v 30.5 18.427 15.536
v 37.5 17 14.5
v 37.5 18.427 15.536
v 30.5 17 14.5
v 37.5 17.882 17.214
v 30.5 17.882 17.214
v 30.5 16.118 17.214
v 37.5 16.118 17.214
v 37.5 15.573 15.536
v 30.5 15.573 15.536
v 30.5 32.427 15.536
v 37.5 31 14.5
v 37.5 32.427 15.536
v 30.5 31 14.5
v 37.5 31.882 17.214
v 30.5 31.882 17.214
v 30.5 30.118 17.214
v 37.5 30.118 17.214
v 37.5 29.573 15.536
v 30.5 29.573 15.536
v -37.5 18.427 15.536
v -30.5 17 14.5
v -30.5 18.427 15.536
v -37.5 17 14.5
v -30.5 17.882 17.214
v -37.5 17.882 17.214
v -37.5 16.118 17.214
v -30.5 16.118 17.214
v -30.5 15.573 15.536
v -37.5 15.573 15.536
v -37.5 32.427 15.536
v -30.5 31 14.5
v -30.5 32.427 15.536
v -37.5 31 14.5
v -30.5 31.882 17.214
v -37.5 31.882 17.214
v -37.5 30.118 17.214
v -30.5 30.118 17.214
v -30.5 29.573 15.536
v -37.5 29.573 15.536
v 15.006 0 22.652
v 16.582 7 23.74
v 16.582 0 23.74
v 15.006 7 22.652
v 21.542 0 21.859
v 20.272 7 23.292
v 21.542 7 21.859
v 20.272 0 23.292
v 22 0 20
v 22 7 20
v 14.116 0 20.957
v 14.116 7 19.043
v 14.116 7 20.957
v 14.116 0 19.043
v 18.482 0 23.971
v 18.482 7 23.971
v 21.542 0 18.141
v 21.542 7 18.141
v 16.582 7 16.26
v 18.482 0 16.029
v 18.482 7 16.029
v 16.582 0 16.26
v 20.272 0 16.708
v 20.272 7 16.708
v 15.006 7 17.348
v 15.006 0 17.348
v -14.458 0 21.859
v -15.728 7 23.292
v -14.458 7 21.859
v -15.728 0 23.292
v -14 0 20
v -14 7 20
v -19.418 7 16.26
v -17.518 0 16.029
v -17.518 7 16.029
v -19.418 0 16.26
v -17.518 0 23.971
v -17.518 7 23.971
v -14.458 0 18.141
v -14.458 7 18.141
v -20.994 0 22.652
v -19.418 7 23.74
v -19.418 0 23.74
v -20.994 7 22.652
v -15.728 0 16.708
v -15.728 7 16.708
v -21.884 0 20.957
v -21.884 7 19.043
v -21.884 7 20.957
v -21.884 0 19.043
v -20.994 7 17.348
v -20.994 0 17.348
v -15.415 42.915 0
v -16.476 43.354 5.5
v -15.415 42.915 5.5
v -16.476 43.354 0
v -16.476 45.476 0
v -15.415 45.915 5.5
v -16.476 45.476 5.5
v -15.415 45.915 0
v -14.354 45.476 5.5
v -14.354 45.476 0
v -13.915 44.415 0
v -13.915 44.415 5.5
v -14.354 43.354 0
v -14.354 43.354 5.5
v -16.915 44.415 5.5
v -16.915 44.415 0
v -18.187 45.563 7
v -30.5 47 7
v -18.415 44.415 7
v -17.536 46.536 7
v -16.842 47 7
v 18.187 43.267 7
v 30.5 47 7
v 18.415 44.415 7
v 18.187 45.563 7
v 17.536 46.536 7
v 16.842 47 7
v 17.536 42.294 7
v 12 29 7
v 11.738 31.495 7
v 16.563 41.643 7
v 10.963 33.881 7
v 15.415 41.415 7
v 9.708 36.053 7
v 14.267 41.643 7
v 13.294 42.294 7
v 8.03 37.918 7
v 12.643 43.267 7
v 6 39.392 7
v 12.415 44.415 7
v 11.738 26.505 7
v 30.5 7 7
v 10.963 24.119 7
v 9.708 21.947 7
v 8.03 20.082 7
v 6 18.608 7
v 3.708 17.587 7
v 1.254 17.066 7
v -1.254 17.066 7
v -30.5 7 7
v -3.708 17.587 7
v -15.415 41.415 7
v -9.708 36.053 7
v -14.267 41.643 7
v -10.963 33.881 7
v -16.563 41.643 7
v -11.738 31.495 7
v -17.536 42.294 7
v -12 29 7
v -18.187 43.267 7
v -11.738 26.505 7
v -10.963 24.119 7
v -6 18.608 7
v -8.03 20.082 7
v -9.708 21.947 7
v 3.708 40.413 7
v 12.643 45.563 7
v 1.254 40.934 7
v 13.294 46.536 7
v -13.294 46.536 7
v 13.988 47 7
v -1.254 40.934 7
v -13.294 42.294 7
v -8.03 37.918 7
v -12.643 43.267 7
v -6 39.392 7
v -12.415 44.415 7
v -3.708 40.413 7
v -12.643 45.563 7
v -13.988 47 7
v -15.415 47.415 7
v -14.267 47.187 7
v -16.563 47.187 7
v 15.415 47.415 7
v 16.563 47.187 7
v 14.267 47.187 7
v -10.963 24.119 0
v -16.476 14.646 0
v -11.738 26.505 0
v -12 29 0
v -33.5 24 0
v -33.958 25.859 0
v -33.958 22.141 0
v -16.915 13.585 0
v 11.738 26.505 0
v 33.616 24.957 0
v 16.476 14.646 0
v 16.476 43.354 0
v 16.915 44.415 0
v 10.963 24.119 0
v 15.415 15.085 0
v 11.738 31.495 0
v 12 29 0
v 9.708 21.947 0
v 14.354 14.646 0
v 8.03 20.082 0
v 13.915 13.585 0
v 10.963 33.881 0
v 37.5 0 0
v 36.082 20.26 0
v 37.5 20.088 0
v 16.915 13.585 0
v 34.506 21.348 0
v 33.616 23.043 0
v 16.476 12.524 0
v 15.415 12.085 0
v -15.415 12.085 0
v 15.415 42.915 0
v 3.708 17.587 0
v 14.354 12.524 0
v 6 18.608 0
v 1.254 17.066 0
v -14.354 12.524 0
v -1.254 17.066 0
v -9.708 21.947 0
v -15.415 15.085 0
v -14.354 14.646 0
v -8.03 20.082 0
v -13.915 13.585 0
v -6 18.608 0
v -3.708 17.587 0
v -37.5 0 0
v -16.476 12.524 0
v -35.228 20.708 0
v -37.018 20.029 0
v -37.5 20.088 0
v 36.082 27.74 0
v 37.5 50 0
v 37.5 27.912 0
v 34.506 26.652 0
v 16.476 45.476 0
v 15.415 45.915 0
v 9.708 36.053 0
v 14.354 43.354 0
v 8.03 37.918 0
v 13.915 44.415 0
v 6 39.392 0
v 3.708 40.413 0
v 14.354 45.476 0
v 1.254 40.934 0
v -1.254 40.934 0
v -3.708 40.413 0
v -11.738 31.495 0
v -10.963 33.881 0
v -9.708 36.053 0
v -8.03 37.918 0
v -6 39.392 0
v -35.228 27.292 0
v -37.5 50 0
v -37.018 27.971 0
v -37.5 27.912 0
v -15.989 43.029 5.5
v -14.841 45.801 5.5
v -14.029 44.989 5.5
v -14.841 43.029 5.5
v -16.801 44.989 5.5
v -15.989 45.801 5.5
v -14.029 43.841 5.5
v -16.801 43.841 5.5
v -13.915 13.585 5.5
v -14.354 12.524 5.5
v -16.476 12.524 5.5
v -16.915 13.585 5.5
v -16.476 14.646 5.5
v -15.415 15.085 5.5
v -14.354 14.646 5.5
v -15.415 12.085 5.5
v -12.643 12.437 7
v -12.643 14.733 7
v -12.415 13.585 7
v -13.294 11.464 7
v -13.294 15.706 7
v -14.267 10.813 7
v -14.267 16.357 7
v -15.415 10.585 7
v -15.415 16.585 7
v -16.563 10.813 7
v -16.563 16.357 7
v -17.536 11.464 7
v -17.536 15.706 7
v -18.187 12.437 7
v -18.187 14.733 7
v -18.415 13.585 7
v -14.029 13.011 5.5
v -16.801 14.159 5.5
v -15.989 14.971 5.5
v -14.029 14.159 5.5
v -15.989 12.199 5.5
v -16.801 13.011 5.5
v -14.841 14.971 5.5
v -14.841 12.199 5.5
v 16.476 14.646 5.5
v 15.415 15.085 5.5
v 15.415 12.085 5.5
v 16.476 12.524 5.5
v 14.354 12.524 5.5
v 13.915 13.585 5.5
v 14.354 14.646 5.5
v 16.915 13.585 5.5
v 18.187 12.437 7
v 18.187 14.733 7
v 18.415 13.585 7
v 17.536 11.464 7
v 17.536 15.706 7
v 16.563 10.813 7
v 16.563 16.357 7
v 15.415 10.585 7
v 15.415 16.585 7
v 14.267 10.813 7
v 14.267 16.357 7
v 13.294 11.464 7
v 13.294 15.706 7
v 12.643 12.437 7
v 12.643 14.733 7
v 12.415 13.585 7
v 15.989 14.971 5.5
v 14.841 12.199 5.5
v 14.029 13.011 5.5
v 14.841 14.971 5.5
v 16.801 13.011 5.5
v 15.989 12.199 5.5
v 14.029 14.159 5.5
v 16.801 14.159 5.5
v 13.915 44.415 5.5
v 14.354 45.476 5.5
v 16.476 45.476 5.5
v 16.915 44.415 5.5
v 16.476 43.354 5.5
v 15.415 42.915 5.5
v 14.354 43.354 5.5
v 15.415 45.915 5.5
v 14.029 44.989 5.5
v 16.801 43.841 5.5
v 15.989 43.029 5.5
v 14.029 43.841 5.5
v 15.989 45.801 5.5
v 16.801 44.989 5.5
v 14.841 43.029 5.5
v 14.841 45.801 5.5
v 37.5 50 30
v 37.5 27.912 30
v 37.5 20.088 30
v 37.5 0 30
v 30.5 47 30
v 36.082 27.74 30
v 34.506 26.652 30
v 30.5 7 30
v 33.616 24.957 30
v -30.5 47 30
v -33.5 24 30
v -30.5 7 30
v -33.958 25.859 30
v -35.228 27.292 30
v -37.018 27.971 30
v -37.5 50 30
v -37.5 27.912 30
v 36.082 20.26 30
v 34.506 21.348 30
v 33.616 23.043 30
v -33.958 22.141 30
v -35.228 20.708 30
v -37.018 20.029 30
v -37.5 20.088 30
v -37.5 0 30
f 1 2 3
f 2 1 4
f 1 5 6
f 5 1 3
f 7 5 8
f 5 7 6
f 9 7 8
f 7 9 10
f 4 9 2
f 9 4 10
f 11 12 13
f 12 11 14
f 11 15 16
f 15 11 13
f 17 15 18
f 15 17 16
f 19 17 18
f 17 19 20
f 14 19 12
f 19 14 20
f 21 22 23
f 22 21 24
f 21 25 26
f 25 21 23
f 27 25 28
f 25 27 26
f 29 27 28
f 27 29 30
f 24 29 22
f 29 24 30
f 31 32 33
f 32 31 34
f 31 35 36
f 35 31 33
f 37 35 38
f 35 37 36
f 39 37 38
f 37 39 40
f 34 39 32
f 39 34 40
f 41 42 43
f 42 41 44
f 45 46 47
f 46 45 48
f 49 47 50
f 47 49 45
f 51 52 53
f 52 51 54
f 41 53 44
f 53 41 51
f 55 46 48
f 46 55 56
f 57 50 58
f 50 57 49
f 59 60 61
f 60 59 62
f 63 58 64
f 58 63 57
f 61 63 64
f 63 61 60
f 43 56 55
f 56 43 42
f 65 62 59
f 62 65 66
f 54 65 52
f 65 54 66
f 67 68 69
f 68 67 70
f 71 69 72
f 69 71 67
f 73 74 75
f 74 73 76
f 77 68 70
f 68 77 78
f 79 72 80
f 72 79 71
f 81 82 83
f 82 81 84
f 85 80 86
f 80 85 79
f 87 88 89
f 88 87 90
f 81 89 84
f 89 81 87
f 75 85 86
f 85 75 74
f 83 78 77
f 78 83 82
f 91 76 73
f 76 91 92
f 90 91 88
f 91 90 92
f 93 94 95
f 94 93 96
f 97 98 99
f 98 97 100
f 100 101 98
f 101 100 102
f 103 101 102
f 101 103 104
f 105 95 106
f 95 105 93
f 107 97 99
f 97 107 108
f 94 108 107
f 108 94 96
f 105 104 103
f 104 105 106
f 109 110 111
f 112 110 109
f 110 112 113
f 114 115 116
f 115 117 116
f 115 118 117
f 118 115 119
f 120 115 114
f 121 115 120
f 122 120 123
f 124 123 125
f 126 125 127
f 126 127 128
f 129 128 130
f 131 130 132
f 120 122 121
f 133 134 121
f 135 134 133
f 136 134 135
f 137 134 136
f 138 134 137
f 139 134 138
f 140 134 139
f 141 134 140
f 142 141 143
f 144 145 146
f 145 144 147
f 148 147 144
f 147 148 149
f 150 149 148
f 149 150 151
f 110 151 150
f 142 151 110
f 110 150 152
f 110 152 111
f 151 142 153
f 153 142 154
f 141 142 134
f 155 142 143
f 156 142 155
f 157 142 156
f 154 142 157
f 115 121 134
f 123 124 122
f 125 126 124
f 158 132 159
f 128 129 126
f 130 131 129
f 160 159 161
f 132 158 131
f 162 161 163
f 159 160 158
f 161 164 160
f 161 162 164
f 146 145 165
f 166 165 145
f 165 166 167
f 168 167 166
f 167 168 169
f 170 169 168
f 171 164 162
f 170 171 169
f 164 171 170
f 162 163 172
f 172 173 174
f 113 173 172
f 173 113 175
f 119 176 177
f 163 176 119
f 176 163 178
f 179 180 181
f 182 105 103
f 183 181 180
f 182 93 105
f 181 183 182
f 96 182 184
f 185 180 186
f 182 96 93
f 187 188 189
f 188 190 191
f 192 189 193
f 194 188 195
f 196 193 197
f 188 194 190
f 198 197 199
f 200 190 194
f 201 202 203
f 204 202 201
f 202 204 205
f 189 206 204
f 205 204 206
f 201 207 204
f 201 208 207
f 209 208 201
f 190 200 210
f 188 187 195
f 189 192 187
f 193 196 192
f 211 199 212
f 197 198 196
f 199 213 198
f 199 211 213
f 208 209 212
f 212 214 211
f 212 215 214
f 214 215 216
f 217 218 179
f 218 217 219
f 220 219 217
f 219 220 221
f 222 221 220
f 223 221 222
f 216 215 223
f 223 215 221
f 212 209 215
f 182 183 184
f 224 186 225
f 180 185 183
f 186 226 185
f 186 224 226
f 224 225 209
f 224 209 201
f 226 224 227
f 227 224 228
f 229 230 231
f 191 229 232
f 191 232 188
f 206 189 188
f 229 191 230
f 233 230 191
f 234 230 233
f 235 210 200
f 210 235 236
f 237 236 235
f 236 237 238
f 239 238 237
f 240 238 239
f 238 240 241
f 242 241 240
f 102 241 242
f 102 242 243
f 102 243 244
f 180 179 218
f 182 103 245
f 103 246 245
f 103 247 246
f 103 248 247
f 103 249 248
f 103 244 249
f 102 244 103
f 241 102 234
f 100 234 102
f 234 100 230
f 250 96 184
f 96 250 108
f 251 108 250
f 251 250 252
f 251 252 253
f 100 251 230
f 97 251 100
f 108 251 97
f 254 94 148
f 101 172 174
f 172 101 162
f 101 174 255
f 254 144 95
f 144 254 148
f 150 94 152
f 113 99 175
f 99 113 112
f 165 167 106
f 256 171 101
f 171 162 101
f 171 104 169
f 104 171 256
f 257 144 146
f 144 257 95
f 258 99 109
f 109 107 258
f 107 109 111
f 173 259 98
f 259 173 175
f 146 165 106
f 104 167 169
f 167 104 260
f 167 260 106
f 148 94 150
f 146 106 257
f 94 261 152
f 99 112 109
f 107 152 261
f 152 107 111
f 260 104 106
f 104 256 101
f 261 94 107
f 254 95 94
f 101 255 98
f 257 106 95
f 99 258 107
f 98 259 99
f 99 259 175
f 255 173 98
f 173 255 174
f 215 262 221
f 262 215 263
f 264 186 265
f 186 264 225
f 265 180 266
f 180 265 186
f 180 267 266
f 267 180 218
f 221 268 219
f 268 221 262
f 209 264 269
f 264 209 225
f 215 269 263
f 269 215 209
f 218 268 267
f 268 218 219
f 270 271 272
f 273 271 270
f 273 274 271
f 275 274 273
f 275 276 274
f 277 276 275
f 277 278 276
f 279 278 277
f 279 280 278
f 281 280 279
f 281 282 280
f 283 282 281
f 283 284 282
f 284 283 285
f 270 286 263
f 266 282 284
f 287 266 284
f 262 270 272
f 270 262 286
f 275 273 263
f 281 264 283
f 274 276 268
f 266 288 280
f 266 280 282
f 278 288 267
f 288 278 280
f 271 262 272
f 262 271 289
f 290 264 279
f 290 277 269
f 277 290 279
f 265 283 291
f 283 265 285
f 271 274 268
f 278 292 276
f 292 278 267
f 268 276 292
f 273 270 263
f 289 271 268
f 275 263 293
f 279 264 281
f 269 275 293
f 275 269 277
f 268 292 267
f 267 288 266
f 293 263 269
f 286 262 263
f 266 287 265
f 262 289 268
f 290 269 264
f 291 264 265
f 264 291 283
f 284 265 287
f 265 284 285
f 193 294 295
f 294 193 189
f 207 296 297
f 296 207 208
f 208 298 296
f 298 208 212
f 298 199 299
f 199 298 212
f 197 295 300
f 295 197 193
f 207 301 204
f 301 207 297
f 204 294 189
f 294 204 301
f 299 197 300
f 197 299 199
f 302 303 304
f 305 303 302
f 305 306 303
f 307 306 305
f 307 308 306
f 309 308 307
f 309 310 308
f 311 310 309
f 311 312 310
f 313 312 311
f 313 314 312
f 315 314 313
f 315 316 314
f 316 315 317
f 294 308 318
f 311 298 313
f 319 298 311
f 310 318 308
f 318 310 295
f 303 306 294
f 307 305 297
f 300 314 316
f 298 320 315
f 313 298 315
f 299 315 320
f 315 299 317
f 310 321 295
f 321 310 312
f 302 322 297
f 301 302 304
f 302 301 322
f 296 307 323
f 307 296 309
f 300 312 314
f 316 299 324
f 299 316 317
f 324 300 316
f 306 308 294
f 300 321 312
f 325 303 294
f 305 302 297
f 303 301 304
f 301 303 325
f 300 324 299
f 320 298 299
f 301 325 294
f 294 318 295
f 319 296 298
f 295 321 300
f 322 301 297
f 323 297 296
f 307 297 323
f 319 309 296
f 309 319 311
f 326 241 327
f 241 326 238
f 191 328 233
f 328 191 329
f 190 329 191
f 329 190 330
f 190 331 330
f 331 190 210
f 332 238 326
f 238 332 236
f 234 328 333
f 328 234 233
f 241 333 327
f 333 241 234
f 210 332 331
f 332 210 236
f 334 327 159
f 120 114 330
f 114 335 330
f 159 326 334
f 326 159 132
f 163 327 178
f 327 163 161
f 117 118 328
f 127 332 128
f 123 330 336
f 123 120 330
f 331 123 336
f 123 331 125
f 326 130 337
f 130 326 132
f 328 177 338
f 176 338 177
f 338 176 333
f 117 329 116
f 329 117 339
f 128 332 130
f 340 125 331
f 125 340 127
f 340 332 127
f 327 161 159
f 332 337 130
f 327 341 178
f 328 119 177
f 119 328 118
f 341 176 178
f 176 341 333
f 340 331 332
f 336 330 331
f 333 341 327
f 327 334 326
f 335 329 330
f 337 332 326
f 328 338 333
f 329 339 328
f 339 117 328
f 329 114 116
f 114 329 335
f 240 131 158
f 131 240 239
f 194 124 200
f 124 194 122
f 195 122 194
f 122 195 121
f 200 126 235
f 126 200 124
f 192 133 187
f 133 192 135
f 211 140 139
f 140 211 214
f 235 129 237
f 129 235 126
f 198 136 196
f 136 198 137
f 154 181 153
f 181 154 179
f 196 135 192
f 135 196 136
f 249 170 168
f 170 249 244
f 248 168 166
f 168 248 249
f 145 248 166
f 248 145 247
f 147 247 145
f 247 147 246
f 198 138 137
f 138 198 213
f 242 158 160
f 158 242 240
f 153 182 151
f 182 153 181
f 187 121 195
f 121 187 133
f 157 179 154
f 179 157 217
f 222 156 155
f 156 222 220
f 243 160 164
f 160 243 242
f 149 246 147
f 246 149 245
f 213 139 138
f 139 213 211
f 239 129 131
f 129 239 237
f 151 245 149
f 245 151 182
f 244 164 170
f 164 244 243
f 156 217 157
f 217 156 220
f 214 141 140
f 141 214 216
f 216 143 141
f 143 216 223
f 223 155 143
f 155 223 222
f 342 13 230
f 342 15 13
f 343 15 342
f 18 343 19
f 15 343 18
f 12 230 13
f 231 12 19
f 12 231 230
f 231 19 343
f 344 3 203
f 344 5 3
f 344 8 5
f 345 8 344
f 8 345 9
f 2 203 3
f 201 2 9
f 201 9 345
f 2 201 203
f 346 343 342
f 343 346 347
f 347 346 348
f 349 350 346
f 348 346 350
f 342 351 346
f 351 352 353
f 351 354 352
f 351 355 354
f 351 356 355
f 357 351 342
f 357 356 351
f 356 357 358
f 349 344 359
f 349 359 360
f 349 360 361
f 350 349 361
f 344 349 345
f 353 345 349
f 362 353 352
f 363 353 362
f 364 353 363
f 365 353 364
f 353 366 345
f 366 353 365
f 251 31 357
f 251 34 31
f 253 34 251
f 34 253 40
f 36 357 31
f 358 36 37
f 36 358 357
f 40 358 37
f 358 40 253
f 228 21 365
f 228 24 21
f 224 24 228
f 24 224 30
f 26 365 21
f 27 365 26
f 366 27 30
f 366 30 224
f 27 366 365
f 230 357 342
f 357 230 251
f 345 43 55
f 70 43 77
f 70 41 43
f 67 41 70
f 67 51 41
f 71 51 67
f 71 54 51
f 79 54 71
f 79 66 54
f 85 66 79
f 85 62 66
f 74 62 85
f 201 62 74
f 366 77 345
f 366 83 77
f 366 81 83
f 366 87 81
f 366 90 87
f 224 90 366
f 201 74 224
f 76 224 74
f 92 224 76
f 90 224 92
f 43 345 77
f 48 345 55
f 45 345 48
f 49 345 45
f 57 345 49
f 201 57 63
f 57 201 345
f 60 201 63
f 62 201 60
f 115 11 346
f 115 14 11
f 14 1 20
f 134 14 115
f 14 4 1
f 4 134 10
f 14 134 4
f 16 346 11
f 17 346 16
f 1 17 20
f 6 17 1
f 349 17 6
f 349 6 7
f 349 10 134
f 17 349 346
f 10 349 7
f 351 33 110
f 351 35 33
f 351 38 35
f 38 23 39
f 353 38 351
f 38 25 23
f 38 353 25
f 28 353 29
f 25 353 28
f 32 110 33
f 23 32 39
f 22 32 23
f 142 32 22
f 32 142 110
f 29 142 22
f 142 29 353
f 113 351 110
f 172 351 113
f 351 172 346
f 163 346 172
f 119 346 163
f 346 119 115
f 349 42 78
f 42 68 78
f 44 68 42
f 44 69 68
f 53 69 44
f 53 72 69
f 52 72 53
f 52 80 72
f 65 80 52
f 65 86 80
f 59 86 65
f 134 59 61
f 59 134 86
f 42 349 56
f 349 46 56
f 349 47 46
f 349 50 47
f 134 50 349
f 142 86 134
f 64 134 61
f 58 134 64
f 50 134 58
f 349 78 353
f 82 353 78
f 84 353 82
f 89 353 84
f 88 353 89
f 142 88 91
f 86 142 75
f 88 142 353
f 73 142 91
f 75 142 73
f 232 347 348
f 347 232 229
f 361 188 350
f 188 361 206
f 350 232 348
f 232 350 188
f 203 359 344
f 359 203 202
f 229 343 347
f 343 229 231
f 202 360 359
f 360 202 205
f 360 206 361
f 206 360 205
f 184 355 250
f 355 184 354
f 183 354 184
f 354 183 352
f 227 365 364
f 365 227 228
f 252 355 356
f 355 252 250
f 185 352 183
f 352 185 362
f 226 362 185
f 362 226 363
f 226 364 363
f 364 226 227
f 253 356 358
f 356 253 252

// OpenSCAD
// file: includes/includes/jonaskuehling-default.scad
module teardrop (r=4.5,h=20,alpha=45,teardropcorner=0,fulldrop=false){		// tear drop hole for top-centering
											// use teardropcorner=1 for bottom horizontal corners
	render()
	translate([-h/2,0,0])
		rotate([-270,0+(teardropcorner*180),90])
			difference(){
				linear_extrude(height=h){
					circle(r, $fn=24);
					polygon(points=[[0,0],[r*cos(alpha),r*sin(alpha)],[0,r/sin(alpha)],[-r*cos(alpha),r*sin(alpha)]], paths=[[0,1,2,3]]);
				}
				if(fulldrop==false) 
					translate([0,(r/sin(alpha))/2+r,h/2]) cube([2*r+2,r/sin(alpha),h+2],center=true);
			}
}

//teardrop(4.5,22,fulldrop=true);



module teardropcentering (r=4.5,h=20,alpha=45){				// tear drop hole for top-centering
	centering_offset_factor = 1.1;
	render()
	translate([-h/2,0,0])
		rotate([-270,0,90])
			difference(){
				linear_extrude(height=h){
					circle(r, $fn=24);
					polygon(points=[[0,0],[r*cos(alpha),r*sin(alpha)],[0,r/sin(alpha)],[-r*cos(alpha),r*sin(alpha)]], paths=[[0,1,2,3]]);
				}
				translate([0,(r/sin(alpha))/2+r*centering_offset_factor,h/2]) cube([2*r+2,r/sin(alpha),h+2],center=true);
			}
}

//teardropcentering();



module teardropcentering_half (r=4.5,h=20, bottom=0,alpha=45){				// tear drop hole for top-centering
																// upper half (bottom=0) or bottom half (bottom=1)
	centering_offset_factor = 1.2;
	render()
	translate([-h/2,0,0])
		rotate([-270,0,90])
			difference(){
				linear_extrude(height=h){
					circle(r, $fn=24);
					polygon(points=[[0,0],[r*cos(alpha),r*sin(alpha)],[0,r/sin(alpha)],[-r*cos(alpha),r*sin(alpha)]], paths=[[0,1,2,3]]);
				}
				translate([0,(r/sin(alpha))/2+r*centering_offset_factor,h/2]) cube([2*r+2,r/sin(alpha),h+2],center=true);
				translate([0,-(r*centering_offset_factor)/2-0.5+bottom*(r*centering_offset_factor+1),h/2]) cube([2*r+2,r*centering_offset_factor+1,h+2],center=true);
			}
}

//teardropcentering_half(bottom=0);


module polyhole(d,h){
	n = max(round(2 * d),3);
	cylinder(h = h, r = (d / 2) / cos (180 / n), $fn = n, center=true);
}



module roundcorner(radius,edge_length){
	render()
	translate([0,0,-1])
		difference(){
			translate([-1,-1,0]) cube(size = [radius+1,radius+1,edge_length+2], center = false);
			translate(v = [radius,radius,-1]) cylinder(h = edge_length+4, r=radius, center=false);
		}
}

//roundcorner(5,5);



module roundcorner_tear(radius,edge_length){
	render()
	difference(){
		translate([-1,-1,-1]) cube(size = [edge_length+2, radius+1, radius+1], center = false);
		translate([(edge_length+4)/2-2, radius, radius])
			teardrop(radius, edge_length+4,teardropcorner=1);
	}
}

//roundcorner_tear(8,20);



module nut_trap(nut_wrench_size,trap_height,vertical=true, clearance=0.2){		// M3 wrench size = 5.5
	cornerdiameter =  (((nut_wrench_size)/2)+clearance) / cos(180/6);
	rotate([0,vertical*90,0])
		cylinder(h = trap_height, r = cornerdiameter, center=true, $fn = 6);
}



module nut_slot(nut_wrench_size,nut_height, nut_elevation,vertical=false, clearance=0.2){		// M3 wrench size = 5.5
	cornerdiameter =  (((nut_wrench_size)/2)+clearance) / cos(180/6);
	slot_height = nut_height+2*clearance;
	slot_width = nut_wrench_size+2*clearance;
	rotate([0,vertical*270,0]){
		cylinder(h = slot_height, r = cornerdiameter, center=true, $fn = 6);
		translate([0,-slot_width/2,-slot_height/2]) cube([nut_elevation+1,slot_width,slot_height]);
	}
}

//nut_slot(5.5,3,4,1);



module barbell (x1,x2,r1,r2,r3,r4) 
{
	x3=triangulate (x1,x2,r1+r3,r2+r3);
	x4=triangulate (x2,x1,r2+r4,r1+r4);
	render()
	difference ()
	{
		union()
		{
			translate(x1)
			circle (r=r1);
			translate(x2)
			circle(r=r2);
			polygon (points=[x1,x3,x2,x4]);
		}
		
		translate(x3)
		circle(r=r3,$fa=5);
		translate(x4)
		circle(r=r4,$fa=5);
	}
}

function triangulate (point1, point2, length1, length2) = 
point1 + 
length1*rotated(
atan2(point2[1]-point1[1],point2[0]-point1[0])+
angle(distance(point1,point2),length1,length2));

function distance(point1,point2)=
sqrt((point1[0]-point2[0])*(point1[0]-point2[0])+
(point1[1]-point2[1])*(point1[1]-point2[1]));

function angle(a,b,c) = acos((a*a+b*b-c*c)/(2*a*b)); 

function rotated(a)=[cos(a),sin(a),0];
// file: includes/lm8uu-holder-slim_double-vertical.scad
// LM8UU holder slim
// *********************************************
// Jonas Kühling
// http://www.jonaskuehling.de
// http://www.thingiverse.com/jonaskuehling
// *********************************************
// derived from:
// http://www.thingiverse.com/thing:14942

use <includes/jonaskuehling-default.scad>

// LM8UU/rod dimensions
LM8UU_dia = 15.4;
LM8UU_length = 24;
rod_dia = 8;

//screw/nut dimensions (M3) - hexagon socket head cap screw ISO 4762, hexagon nut ISO 4032
screw_thread_dia_iso = 3;
screw_head_dia_iso = 5.5;
nut_wrench_size_iso = 5.5;


// screw/nut dimensions for use (plus clearance for fitting purpose)
clearance_dia = 0.5;
screw_thread_dia = screw_thread_dia_iso + clearance_dia;
screw_head_dia = screw_head_dia_iso + clearance_dia;
nut_wrench_size = nut_wrench_size_iso + clearance_dia;
nut_dia_perimeter = (nut_wrench_size/cos(30));
nut_dia = nut_dia_perimeter;
nut_surround_thickness = 2;

// main body dimensions
body_wall_thickness = 2;
body_width = LM8UU_dia + (2*body_wall_thickness);
body_height = body_width;
body_length = 60;
gap_width = rod_dia + 2;
screw_bushing_space = 1;
screw_elevation = LM8UU_dia + body_wall_thickness + (screw_thread_dia/2) +screw_bushing_space;

overhang_angle = 60;
r = nut_dia_perimeter/2+nut_surround_thickness;
extra_height_varticalprint = r*sin(90-overhang_angle);

// TEST - uncomment to render in openscad:
//lm8uu_holder_slim_double_vertical();		



// main body
module lm8uu_holder_slim_double_vertical()
{
	// rotate vertical and center bearing around z-axis
	translate([0,-(LM8UU_dia/2+body_wall_thickness),body_length/2])
	rotate([-90,0,0])
	difference()
	{
		union()
		{	
			// body
			translate([-body_width/2,-body_length/2,body_height/2])
				cube([body_width,body_length,(LM8UU_dia/2)+screw_bushing_space+(screw_thread_dia/2)+extra_height_varticalprint]);
			translate([0,0,(LM8UU_dia/2)+body_wall_thickness])		
				rotate([90,0,0])
					cylinder(r=(LM8UU_dia/2)+body_wall_thickness, h=body_length, center=true);
	
			// gap support
			translate([-(gap_width/2)-body_wall_thickness,-(body_length/2),body_height/2])
				cube([body_wall_thickness,LM8UU_length,(LM8UU_dia/2)+screw_bushing_space+(screw_thread_dia/2)]);
			translate([gap_width/2,-(body_length/2),body_height/2])
				cube([body_wall_thickness,LM8UU_length,(LM8UU_dia/2)+screw_bushing_space+(screw_thread_dia/2)]);
	
			for(i=[-(body_length/2-LM8UU_length/2),(body_length/2-LM8UU_length/2)])
			{
				// nut trap surround
				translate([gap_width/2,i,screw_elevation])
					rotate([0,90,0])
						cylinder(r=(((nut_wrench_size+nut_surround_thickness*2)/cos(30))/2), h=(body_width-gap_width)/2, $fn=20);
	
				// Screw hole surround
				translate([-gap_width/2,i,screw_elevation])
					rotate([0,-90,0])
						cylinder(r=(screw_head_dia/2)+nut_surround_thickness, h=(body_width-gap_width)/2, $fn=20);
			}
		}
	
		// bushing hole
		translate([0,0,LM8UU_dia/2+2])
			rotate([90,0,0])
				polyhole(d=LM8UU_dia, h=body_length+1, center=true);
	
		// top gap
		translate([-(gap_width/2),-(body_length/2)-1,body_height/2])
			cube([gap_width,body_length+2,(LM8UU_dia/2)+screw_bushing_space+(screw_thread_dia/2)+(nut_dia/2)+nut_surround_thickness+1]);
	
		for(i=[-(body_length/2-LM8UU_length/2),(body_length/2-LM8UU_length/2)])
		{
			// screw hole (one all the way through)
			translate([0,i,screw_elevation])
				rotate([0,90,0])
					polyhole(d=screw_thread_dia, h=body_width+3, center=true);
		
			// nut trap
			translate([gap_width/2+body_wall_thickness,i,screw_elevation])
				rotate([0,90,0])
					cylinder(r=nut_dia/2, h=body_width/2-gap_width/2-body_wall_thickness+1,$fn=6);
		
			// screw head hole
			translate([-(gap_width)/2-body_wall_thickness,i,screw_elevation])
				rotate([0,-90,0])
					cylinder(r=screw_head_dia/2, h=body_width/2-gap_width/2-body_wall_thickness+1,$fn=20);

		}	
	}
}

/*
// Based on nophead research
module polyhole(d,h,center=false) {
    n = max(round(2 * d),3);
    rotate([0,0,180])
        cylinder(h = h, r = (d / 2) / cos (180 / n), center=center, $fn = n);
}
*/
// file: configuration.scad
// Harmonic drive main parameters
press_angle = 40;
flex_teeth = 50;
teeth_diff = 2;

tol = 0.25; // generic tolerance used in some places
lh = 0.3; // layer height needed in a few places

// Main geometry
bearing_r = 22/2;
bearing_h = 7;
washer_h = 1;
bolthead_h = 4;
stepper_shaft_h = 20;
circ_drive_bearing_indent = 1;
flex_bearing_indent = 1;
drive_bearing_r = 13/2;
drive_bearing_h = 7;

// Flexspline dimensions
flex_inner_r = 25.4;
flex_h = 36;
flex_bottom_h = 2;
flex_bolthole_r = 6;
flex_wt = 0.81;
flex_lip = 1;
pitch = 197;
helix_twist = 5;

// Circspline dimensions
circ_h = 20;
circ_outer_r = 34;
circ_inner_r = 30;
circ_bottom_h = 4;
// Negative clearance cuts a bit from the top of the teeth
circ_tooth_clearance = -0.5;

// Wave driver dimensions
wave_radius = 52.75/2;
driver_h = 12;
driver_w = 10;
drive_bearing_spacing_r = wave_radius - drive_bearing_r;

// The total height of the drive unit, excluding the motor and flexspline base.
assy_h = 50;
stepper_shaft_l = 20;

tooth_overlap = (flex_h + circ_h) - assy_h;

// Position of the middle of the tooth overlap section on the stepper shaft.
stepper_shaft_mid_rot = circ_h - tooth_overlap/2;

echo(str("Tooth overlap: ", tooth_overlap));
echo(str("Drive midpoint on stepper shaft: ", stepper_shaft_mid_rot));

red_r = teeth_diff/flex_teeth;
echo(str("Reduction ratio: 1/", flex_teeth/teeth_diff, " (", red_r, ")"));
echo(str("With 200x16 motor, arc minutes per microstep: ", 360*60/(200*16)*red_r));
echo(str("Linear resolution (mm) for 100 mm arm: ", sin(360/(200*16)*red_r) * 100));
echo(str("Torque (N) at 100 mm for 40 Ncm motor: ", 4/red_r));
echo(str("Linear speed equivalent to standard Prusa's 300 mm/s at 100 mm: ",
         300*80 * sin(360/(200*16)*red_r) * 100));

// Circspline mount dimensions
circ_mount_r = circ_outer_r + 6;
circ_mount_h = 8;
circ_mount_1 = 45;
circ_mount_2 = 135;
circ_mount_3 = 225;

// Master arm height setting
main_arm1_height = 12;
main_arm2_height = 12;

// Arm 1st segment dimensions
arm_flex_base_bottom_h = 3;
arm_flex_base_h = 8;
arm_joint1_base_h = main_arm1_height;
arm_joint1_base_r = 15;
arm_joint1_bearing_indent = 7;
arm_large_bolthole_r=6;
arm_w = 30;
arm1_h = main_arm1_height;

// default length
length = 100;

// Truss generation parameters. The element width must be smaller than
// thickness to avoid the top becoming unprintable (triangle outlines
// over thin air)
truss_thickness = 3.5;
truss_width_coeff = 0.75;
truss_radius = 0.1;
truss_arm1 = 1.07; // Extra coefficient for arm1

// Arm 2nd segment dimensions
arm2_h = main_arm2_height;
arm_separation = arm_joint1_base_h - arm_joint1_bearing_indent 
  + bearing_h + washer_h * 2;
arm_bolthole_r=4;
arm_joint2_base_h = main_arm2_height;
arm_joint2_base_r = 15;
arm_joint3_hollow_r = 10;
arm_joint31_base_h = main_arm2_height;
arm_joint31_base_r = 15;
arm_joint31_bearing_r = 13/2;
arm_joint31_bearing_h = 5;
arm_joint31_bearing_clearance = 2;
arm_joint32_base_h = main_arm2_height;
arm_joint32_base_r = 15;
arm_joint32_tube_h_clearance = 1;
arm_joint32_tube_wt = 2;
arm_joint32_tube_groove_depth = 1;
arm_joint31_bearing_spacing = arm_joint3_hollow_r + arm_joint32_tube_wt 
  + arm_joint31_bearing_r;

echo(str("Arm final stage vertical separation: ", arm_separation));
echo(str("Arm final stage total height: ", arm_separation + 2 * arm2_h));

// Default arm lengths
arm1_length = 100;
arm2_length = 150;
arm_spacing = 75;
arm_base_maxrot = 90 - asin((circ_outer_r + arm_w/2) / arm_spacing);
arm_joint_maxrot = 150; // hand-tuned
echo(str("Arm base minimum rotation to clear other base: ", arm_base_maxrot));

// Z carriage dimensions
carr_floor = 1; // Carriage floor thickness.
carr_wt = 3; // Carriage wall thickness.
carr_truss_width = arm_spacing + bearing_r * 2 + 4; // 120;
carr_truss_depth = 15;
drive_h = assy_h + bearing_h + washer_h 
  + arm_flex_base_bottom_h; // Total length needed by the drive unit.
carr_truss_length = circ_outer_r + 1 + carr_wt + bearing_r + 2;
carr_rod_offset = -45;
carr_drive_offset = -40;
carr_top_support_thickness = 3;
carr_top_support_width = 14;
carr_top_support_length = 70;

// Z end dimensions
z_end_bottom_thickness = 7;
z_end_bottom_width = arm_spacing + 20;
z_end_bottom_length = 40;
z_end_top_length = 50;
z_end_bottom_height = 30;
z_end_rod_offset = 24; // rod center from vertical plate
// file: common.scad
include <configuration.scad>;
use <includes/parametric_involute_gear_v5.0.scad>;
use <includes/SolidReplacementTruss.scad>;
include <includes/lm8uu-holder-slim_double-vertical.scad>;

// Generic spline gear with a herringbone section
module spline_gear(number_of_teeth, circular_pitch, pressure_angle,
                   height, helix_height, twist, backlash, clearance) {
  gear(number_of_teeth=number_of_teeth,
	     circular_pitch=circular_pitch,
	     pressure_angle=pressure_angle,
	     clearance = clearance,
	     gear_thickness = height - helix_height,
   	     rim_thickness = height - helix_height,
	     rim_width = 5,
	     hub_thickness = height - helix_height,
	     hub_diameter=0,
         bore_diameter=0,
	     circles=0,
         backlash=backlash,
	     twist=0);
  translate([0, 0, height - helix_height])
    gear(number_of_teeth=number_of_teeth,
	     circular_pitch=circular_pitch,
	     pressure_angle=pressure_angle,
	     clearance = clearance,
	     gear_thickness = helix_height/2,
   	     rim_thickness = helix_height/2,
	     rim_width = 5,
	     hub_thickness = helix_height/2,
	     hub_diameter=0,
         bore_diameter=0,
	     circles=0,
         backlash=backlash,
	     twist=twist);
  rotate([0, 0, -twist])
  translate([0, 0, height - helix_height/2])
    gear(number_of_teeth=number_of_teeth,
	     circular_pitch=circular_pitch,
	     pressure_angle=pressure_angle,
	     clearance = clearance,
	     gear_thickness = helix_height/2,
   	     rim_thickness = helix_height/2,
	     rim_width = 5,
	     hub_thickness = helix_height/2,
	     hub_diameter=0,
         bore_diameter=0,
	     circles=0,
         backlash=backlash,
	     twist=-twist);
}

// Simplified module for creating flexsplines (with helix section)
module flexspline_helix_gear(height, backlash, clearance) {
  spline_gear(number_of_teeth=flex_teeth,
	     circular_pitch=pitch,
	     pressure_angle=press_angle,
	     height=height,
         helix_height=tooth_overlap,
         backlash=backlash,
         clearance = clearance,
	     twist=-helix_twist);

}

// Simplified module for creating flexsplines (without helix section)
module flexspline_gear(height, backlash, clearance) {
  gear(number_of_teeth=flex_teeth,
	     circular_pitch=pitch,
	     pressure_angle=press_angle,
	     clearance = clearance,
	     gear_thickness = height,
   	     rim_thickness = height,
	     rim_width = 5,
	     hub_thickness = height,
	     hub_diameter=0,
         bore_diameter=0,
	     circles=0,
         backlash=backlash,
	     twist=0);
}

// Variation of the truss_platform, does not try to make the edges
// vertical but instead leaves them slanted.
module my_truss_platform(length, width, height, thickness,
			 element_width, radius) 
{ 
  segments = 2*floor(width/height)+1; 
  seg_width = width/(segments+1);
    
  if (segments > 0)
    for(i = [1 : segments])
      {
	translate([0, (seg_width)*(i-1)+2*seg_width*(1+pow(-1,i))/2, 
		   (height)*(1+pow(-1,i))/2])
	  {
	    rotate([180*(1+pow(-1, i))/2, 0, 0])
	      isoc_truss(length, seg_width*2, height, thickness, 
			 element_width, radius);
	  }
      }
}

module z_end_bottom_clamp_bolts() {
  translate([0, -7, 0]) rotate([0, 90, 0]) cylinder(r=1.5, h=20);
  translate([0, 7, 0]) rotate([0, 90, 0]) cylinder(r=1.5, h=20);  
}
// main file
include <common.scad>;

module z_end_top() {
  difference() {
    union() {
      translate([-arm_spacing/2, 0, 0])
        cube([arm_spacing, z_end_top_length, z_end_bottom_height]);
    }
    translate([-arm_spacing/2 + z_end_bottom_thickness, 
               z_end_bottom_thickness, z_end_bottom_thickness])
      cube([arm_spacing - z_end_bottom_thickness * 2, z_end_bottom_length, 
	    z_end_bottom_height]);
    translate([arm_spacing/2, z_end_rod_offset, 0])
      cylinder(r=4, h=50);
    translate([-arm_spacing/2, z_end_rod_offset, 0])
      cylinder(r=4, h=50);
    translate([arm_spacing/2 - 10, z_end_rod_offset, 16])
      z_end_bottom_clamp_bolts();
    mirror([1, 0, 0])
      translate([arm_spacing/2 - 10, z_end_rod_offset, 16])
      z_end_bottom_clamp_bolts();
    translate([0, 10, -4]) rotate([90, 0, 0]) {
      translate([18, 24, 0]) cylinder(r=4, h=20);
      translate([-18, 24, 0]) cylinder(r=4, h=20);
    }
    // NEMA17 screw holes
    translate([0, z_end_rod_offset - carr_rod_offset + carr_drive_offset, 0]) {
      for (i = [45 : 90 : 315]) {
	rotate(i, [0, 0, 1])
	  translate([0, 21.8, 0])
	  union() {
	  cylinder(r = 1.5, h = z_end_bottom_thickness, $fn=8);
	  translate([0, 0, z_end_bottom_thickness - 1.5])
	    cylinder(r1 = 1.5, r2 = 3, h = 1.5, $fn=16);
	}
	cylinder(r = 12, h = z_end_bottom_thickness); // NEMA17 central hole
      }
    }
  }
}

z_end_top();
